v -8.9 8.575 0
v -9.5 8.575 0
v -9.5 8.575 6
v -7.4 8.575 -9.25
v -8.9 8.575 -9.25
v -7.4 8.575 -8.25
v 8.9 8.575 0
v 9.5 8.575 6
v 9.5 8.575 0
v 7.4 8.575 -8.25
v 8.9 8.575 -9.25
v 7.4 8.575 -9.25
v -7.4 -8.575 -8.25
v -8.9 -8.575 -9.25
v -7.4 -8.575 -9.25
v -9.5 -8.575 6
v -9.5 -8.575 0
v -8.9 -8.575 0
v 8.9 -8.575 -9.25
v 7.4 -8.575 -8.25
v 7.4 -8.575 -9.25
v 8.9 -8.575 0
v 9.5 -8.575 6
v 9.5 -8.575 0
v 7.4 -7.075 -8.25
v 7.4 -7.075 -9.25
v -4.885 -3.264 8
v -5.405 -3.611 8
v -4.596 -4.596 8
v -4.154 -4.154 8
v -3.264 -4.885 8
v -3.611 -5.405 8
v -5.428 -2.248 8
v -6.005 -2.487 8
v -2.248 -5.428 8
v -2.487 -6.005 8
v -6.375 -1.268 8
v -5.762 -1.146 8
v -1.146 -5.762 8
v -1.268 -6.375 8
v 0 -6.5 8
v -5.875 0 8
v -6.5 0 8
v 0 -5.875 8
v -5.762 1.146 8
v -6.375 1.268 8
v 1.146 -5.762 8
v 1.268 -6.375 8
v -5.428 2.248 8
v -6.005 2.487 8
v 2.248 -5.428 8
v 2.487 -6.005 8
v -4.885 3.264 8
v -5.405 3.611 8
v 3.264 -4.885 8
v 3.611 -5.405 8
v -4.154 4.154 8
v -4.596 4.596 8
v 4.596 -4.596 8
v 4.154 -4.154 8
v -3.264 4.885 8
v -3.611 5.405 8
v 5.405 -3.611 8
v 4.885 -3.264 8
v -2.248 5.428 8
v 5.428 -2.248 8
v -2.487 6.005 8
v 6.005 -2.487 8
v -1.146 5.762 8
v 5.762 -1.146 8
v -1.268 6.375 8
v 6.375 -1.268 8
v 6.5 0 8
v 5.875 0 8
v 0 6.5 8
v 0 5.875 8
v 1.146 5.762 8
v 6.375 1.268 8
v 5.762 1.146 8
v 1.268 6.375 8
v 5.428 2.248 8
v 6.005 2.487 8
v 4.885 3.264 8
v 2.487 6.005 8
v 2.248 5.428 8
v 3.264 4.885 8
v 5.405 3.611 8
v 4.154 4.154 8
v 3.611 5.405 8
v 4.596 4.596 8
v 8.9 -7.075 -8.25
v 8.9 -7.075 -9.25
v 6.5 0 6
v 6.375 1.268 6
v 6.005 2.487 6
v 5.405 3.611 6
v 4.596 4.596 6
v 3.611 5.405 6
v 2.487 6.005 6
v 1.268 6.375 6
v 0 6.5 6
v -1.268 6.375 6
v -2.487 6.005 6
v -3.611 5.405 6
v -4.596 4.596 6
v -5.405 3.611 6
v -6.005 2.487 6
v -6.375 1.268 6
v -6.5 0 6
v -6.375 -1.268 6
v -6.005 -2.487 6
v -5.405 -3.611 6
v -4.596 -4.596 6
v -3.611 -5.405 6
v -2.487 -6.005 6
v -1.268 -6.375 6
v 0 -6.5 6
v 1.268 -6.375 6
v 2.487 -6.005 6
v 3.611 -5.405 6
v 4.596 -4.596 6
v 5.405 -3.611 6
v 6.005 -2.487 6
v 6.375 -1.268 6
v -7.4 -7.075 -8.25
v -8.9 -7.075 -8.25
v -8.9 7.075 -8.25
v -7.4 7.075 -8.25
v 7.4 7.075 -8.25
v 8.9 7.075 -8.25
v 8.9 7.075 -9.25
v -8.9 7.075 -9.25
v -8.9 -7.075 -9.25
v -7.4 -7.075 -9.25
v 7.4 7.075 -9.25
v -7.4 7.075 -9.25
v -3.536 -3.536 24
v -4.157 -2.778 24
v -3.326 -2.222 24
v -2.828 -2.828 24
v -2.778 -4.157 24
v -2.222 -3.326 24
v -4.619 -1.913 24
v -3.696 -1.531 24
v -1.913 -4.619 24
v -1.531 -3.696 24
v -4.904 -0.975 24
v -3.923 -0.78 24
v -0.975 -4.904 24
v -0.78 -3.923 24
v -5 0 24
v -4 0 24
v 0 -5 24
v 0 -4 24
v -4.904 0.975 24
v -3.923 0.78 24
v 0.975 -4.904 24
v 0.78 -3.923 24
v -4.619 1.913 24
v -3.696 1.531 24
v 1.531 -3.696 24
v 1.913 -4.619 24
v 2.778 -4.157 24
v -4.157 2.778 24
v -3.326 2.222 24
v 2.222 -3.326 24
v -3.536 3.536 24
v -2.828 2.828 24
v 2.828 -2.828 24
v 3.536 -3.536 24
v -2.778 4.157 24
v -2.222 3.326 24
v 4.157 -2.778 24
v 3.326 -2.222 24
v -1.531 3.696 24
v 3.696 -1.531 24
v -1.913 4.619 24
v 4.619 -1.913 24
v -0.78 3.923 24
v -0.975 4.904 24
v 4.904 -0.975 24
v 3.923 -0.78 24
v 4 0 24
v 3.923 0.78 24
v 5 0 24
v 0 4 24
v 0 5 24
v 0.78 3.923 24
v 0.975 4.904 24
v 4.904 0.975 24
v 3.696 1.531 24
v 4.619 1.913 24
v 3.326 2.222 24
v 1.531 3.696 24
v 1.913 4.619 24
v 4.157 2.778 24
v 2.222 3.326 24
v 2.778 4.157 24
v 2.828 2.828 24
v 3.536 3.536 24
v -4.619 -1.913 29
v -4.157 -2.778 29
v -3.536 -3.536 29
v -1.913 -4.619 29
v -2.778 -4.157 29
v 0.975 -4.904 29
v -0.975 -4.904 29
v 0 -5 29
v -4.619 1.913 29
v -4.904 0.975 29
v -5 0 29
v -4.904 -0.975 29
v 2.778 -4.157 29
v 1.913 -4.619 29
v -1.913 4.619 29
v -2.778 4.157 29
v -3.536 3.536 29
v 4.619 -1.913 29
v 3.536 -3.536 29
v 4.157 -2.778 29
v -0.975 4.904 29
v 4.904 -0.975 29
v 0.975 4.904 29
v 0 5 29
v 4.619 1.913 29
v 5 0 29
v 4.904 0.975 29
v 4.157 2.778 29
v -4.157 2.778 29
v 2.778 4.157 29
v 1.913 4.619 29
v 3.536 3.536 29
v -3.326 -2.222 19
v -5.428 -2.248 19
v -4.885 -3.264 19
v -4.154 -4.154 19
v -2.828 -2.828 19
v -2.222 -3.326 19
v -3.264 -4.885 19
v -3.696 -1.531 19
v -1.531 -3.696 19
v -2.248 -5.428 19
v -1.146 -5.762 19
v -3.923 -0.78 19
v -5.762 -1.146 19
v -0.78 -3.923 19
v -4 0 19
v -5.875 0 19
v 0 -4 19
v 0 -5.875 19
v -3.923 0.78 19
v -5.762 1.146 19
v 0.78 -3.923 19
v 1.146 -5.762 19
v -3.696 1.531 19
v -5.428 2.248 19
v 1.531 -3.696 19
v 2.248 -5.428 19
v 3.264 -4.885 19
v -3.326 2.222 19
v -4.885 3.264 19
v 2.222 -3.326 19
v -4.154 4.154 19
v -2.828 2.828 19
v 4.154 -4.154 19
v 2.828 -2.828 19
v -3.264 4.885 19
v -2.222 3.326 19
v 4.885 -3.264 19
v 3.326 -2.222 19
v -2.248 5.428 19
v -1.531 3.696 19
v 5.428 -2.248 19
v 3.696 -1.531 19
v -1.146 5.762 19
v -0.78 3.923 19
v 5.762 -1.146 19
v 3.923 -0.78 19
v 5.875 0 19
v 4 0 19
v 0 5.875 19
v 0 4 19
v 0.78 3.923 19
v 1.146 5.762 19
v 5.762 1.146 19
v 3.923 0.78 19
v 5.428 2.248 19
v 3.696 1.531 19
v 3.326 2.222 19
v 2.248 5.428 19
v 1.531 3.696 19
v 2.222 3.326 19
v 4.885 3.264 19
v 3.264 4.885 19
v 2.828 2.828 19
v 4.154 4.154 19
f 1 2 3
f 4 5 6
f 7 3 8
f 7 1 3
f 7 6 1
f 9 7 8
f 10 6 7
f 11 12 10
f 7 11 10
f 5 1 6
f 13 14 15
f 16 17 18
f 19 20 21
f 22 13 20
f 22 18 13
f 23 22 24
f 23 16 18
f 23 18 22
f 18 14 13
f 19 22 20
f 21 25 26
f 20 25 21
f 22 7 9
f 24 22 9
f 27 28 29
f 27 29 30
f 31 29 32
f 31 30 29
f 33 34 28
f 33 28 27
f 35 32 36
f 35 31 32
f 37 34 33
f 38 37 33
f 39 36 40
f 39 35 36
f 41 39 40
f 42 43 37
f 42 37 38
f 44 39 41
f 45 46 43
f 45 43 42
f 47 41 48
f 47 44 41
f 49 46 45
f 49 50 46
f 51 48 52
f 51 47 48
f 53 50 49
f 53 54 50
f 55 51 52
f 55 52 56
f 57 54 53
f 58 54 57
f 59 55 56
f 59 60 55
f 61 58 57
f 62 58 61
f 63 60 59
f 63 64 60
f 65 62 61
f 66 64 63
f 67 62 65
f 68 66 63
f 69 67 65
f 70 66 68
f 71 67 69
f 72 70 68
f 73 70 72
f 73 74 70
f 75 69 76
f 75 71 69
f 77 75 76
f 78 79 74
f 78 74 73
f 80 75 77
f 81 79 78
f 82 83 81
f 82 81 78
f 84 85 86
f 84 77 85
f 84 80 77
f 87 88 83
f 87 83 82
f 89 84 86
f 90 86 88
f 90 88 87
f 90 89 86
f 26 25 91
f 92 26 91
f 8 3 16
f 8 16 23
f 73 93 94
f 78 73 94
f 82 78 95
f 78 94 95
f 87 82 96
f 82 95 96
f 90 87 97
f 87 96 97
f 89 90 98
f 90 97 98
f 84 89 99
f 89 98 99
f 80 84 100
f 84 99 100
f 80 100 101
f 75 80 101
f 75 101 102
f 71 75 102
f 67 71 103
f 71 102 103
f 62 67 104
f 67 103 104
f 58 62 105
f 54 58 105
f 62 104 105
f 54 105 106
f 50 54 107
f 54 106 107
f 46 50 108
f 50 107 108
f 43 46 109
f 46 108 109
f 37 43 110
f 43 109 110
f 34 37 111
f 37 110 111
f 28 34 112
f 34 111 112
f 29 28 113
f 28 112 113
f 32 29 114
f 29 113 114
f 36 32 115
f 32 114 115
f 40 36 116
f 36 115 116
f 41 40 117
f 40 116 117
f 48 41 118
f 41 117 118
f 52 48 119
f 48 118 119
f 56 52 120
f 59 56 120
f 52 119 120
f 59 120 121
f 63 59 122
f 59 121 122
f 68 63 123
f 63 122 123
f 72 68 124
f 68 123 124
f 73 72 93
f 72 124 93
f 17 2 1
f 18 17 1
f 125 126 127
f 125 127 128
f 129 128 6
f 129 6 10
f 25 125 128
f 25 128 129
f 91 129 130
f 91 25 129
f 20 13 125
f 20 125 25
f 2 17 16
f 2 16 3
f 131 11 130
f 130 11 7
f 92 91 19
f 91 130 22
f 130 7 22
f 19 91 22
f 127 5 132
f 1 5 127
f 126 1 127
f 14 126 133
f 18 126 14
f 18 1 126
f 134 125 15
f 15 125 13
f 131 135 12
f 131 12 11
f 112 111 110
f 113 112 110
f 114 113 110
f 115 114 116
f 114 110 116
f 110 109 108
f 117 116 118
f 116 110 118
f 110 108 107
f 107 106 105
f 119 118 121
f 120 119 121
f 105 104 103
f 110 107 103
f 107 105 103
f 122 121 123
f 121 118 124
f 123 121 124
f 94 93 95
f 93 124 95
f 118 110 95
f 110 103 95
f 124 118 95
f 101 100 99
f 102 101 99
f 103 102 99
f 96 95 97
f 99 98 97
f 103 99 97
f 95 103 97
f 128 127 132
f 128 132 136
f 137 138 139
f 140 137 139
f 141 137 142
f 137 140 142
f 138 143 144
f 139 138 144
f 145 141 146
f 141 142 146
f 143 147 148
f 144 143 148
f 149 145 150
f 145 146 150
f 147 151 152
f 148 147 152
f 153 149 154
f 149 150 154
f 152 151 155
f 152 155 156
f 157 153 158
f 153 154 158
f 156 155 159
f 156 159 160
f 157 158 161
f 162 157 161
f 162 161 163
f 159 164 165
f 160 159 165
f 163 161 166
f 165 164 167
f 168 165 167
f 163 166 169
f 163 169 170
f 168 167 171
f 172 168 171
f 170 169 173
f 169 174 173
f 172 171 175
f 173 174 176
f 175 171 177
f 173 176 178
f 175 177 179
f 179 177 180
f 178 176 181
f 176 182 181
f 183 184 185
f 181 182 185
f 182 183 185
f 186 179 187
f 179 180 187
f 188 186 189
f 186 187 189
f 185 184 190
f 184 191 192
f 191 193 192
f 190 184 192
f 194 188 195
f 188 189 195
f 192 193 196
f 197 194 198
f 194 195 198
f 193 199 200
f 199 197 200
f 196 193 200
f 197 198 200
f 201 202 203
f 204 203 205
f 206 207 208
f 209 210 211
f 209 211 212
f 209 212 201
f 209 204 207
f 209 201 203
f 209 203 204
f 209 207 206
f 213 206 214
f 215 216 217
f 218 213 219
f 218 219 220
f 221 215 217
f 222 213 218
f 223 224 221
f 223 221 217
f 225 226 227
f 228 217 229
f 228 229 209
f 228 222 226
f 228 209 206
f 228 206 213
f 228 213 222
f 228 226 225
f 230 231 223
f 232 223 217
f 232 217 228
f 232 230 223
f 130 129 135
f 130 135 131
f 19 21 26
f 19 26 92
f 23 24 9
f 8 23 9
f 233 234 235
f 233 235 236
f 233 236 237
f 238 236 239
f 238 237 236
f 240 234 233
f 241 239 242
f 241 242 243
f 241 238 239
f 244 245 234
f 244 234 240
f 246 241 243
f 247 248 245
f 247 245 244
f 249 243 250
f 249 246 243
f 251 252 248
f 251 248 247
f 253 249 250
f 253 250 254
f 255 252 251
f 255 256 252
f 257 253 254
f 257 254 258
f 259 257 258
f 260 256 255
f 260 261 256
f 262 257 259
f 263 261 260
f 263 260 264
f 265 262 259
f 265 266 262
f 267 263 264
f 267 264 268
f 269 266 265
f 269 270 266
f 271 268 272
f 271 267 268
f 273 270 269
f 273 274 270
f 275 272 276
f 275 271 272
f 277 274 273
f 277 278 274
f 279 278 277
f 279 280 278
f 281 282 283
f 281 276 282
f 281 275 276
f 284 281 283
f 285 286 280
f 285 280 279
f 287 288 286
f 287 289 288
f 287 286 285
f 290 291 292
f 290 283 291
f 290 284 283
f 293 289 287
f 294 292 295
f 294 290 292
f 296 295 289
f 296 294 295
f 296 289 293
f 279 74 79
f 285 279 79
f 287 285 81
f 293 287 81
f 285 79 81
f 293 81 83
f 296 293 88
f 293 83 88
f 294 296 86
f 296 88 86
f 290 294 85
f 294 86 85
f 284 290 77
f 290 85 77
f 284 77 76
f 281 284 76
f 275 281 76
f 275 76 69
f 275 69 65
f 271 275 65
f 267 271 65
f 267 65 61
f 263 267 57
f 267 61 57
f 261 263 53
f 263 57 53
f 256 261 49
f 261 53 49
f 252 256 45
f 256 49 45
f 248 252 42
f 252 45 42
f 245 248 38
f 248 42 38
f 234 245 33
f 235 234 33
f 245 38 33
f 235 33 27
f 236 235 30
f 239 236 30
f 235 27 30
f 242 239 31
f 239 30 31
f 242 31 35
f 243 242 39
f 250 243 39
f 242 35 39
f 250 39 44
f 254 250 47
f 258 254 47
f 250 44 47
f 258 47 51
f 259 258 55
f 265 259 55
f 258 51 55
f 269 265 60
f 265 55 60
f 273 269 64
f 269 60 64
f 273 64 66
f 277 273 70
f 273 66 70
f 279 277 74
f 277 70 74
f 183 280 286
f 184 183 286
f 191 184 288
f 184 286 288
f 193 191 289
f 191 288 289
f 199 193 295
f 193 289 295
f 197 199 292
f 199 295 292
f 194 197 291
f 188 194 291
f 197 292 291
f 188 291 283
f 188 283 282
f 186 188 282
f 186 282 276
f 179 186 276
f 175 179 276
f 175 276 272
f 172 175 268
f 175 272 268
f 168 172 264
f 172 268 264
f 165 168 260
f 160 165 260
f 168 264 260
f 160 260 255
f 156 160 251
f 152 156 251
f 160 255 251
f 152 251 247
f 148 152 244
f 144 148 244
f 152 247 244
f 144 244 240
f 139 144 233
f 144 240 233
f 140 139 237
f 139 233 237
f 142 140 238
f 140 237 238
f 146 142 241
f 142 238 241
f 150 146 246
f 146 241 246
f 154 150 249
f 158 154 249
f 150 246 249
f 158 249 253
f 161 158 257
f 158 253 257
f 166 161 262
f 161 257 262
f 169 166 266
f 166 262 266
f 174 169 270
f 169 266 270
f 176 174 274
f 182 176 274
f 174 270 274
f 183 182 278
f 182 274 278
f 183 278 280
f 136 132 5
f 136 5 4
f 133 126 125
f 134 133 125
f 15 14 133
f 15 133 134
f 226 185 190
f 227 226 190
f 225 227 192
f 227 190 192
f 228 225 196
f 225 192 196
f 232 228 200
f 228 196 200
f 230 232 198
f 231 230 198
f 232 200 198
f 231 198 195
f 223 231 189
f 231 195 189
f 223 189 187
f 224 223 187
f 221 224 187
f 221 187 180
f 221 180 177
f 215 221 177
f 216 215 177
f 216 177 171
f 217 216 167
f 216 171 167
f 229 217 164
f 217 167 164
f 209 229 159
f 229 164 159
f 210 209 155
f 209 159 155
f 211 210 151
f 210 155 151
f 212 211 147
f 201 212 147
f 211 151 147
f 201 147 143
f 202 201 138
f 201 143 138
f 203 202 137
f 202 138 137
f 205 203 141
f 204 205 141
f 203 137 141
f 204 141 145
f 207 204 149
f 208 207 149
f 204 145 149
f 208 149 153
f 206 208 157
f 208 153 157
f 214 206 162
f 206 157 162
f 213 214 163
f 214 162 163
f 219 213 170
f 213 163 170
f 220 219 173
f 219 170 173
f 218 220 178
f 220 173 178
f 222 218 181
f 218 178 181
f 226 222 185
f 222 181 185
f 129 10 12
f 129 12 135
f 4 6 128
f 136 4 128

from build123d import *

# Parameters (mm, degrees)
F0_W      = 19
F0_H      = 17.15
F1_DEPTH  = 6
F2_W      = 17.8
F2_H      = 17.15
F3_DEPTH  = 8.25
F4_W      = 1.5
F4_H      = 1.5
F5_DEPTH  = 1
F6_R      = 6.5
F7_DEPTH  = 2
F8_R      = 5.875
F9_DEPTH  = 11
F10_R     = 4
F11_DEPTH = 5
F12_R     = 5
F13_DEPTH = 5


with BuildPart() as f1:
    # F0 (on Top) → F1 (new body)
    with BuildSketch(Plane.XY):
        Rectangle(F0_W, F0_H)
    extrude(amount=F1_DEPTH)

    # F2 (on face) → F3 (join)
    with BuildSketch(Plane(origin=(0, 0, 0), x_dir=(1, 0, 0), z_dir=(0, 0, -1))):
        Rectangle(F2_W, F2_H)
    extrude(amount=F3_DEPTH)

    # F4 (on face) → F5 (join)
    with BuildSketch(Plane(origin=(0, 0, -8.25), x_dir=(1, 0, 0), z_dir=(0, 0, -1))):
        with Locations((-8.15, 7.825)):
            Rectangle(F4_W, F4_H)
        with Locations((8.15, 7.825)):
            Rectangle(F4_W, F4_H)
        with Locations((-8.15, -7.825)):
            Rectangle(F4_W, F4_H)
        with Locations((8.15, -7.825)):
            Rectangle(F4_W, F4_H)
    extrude(amount=F5_DEPTH)


with BuildPart() as f7:
    # F6 (on face) → F7 (new body)
    with BuildSketch(Plane.XY.offset(6)):
        Circle(F6_R)
    extrude(amount=F7_DEPTH)

    # F8 (on face) → F9 (join)
    with BuildSketch(Plane.XY.offset(8)):
        Circle(F8_R)
    extrude(amount=F9_DEPTH)

    # F10 (on face) → F11 (join)
    with BuildSketch(Plane.XY.offset(19)):
        Circle(F10_R)
    extrude(amount=F11_DEPTH)

    # F12 (on face) → F13 (join)
    with BuildSketch(Plane.XY.offset(24)):
        Circle(F12_R)
    extrude(amount=F13_DEPTH)


solid = Compound([f1.part, f7.part])
